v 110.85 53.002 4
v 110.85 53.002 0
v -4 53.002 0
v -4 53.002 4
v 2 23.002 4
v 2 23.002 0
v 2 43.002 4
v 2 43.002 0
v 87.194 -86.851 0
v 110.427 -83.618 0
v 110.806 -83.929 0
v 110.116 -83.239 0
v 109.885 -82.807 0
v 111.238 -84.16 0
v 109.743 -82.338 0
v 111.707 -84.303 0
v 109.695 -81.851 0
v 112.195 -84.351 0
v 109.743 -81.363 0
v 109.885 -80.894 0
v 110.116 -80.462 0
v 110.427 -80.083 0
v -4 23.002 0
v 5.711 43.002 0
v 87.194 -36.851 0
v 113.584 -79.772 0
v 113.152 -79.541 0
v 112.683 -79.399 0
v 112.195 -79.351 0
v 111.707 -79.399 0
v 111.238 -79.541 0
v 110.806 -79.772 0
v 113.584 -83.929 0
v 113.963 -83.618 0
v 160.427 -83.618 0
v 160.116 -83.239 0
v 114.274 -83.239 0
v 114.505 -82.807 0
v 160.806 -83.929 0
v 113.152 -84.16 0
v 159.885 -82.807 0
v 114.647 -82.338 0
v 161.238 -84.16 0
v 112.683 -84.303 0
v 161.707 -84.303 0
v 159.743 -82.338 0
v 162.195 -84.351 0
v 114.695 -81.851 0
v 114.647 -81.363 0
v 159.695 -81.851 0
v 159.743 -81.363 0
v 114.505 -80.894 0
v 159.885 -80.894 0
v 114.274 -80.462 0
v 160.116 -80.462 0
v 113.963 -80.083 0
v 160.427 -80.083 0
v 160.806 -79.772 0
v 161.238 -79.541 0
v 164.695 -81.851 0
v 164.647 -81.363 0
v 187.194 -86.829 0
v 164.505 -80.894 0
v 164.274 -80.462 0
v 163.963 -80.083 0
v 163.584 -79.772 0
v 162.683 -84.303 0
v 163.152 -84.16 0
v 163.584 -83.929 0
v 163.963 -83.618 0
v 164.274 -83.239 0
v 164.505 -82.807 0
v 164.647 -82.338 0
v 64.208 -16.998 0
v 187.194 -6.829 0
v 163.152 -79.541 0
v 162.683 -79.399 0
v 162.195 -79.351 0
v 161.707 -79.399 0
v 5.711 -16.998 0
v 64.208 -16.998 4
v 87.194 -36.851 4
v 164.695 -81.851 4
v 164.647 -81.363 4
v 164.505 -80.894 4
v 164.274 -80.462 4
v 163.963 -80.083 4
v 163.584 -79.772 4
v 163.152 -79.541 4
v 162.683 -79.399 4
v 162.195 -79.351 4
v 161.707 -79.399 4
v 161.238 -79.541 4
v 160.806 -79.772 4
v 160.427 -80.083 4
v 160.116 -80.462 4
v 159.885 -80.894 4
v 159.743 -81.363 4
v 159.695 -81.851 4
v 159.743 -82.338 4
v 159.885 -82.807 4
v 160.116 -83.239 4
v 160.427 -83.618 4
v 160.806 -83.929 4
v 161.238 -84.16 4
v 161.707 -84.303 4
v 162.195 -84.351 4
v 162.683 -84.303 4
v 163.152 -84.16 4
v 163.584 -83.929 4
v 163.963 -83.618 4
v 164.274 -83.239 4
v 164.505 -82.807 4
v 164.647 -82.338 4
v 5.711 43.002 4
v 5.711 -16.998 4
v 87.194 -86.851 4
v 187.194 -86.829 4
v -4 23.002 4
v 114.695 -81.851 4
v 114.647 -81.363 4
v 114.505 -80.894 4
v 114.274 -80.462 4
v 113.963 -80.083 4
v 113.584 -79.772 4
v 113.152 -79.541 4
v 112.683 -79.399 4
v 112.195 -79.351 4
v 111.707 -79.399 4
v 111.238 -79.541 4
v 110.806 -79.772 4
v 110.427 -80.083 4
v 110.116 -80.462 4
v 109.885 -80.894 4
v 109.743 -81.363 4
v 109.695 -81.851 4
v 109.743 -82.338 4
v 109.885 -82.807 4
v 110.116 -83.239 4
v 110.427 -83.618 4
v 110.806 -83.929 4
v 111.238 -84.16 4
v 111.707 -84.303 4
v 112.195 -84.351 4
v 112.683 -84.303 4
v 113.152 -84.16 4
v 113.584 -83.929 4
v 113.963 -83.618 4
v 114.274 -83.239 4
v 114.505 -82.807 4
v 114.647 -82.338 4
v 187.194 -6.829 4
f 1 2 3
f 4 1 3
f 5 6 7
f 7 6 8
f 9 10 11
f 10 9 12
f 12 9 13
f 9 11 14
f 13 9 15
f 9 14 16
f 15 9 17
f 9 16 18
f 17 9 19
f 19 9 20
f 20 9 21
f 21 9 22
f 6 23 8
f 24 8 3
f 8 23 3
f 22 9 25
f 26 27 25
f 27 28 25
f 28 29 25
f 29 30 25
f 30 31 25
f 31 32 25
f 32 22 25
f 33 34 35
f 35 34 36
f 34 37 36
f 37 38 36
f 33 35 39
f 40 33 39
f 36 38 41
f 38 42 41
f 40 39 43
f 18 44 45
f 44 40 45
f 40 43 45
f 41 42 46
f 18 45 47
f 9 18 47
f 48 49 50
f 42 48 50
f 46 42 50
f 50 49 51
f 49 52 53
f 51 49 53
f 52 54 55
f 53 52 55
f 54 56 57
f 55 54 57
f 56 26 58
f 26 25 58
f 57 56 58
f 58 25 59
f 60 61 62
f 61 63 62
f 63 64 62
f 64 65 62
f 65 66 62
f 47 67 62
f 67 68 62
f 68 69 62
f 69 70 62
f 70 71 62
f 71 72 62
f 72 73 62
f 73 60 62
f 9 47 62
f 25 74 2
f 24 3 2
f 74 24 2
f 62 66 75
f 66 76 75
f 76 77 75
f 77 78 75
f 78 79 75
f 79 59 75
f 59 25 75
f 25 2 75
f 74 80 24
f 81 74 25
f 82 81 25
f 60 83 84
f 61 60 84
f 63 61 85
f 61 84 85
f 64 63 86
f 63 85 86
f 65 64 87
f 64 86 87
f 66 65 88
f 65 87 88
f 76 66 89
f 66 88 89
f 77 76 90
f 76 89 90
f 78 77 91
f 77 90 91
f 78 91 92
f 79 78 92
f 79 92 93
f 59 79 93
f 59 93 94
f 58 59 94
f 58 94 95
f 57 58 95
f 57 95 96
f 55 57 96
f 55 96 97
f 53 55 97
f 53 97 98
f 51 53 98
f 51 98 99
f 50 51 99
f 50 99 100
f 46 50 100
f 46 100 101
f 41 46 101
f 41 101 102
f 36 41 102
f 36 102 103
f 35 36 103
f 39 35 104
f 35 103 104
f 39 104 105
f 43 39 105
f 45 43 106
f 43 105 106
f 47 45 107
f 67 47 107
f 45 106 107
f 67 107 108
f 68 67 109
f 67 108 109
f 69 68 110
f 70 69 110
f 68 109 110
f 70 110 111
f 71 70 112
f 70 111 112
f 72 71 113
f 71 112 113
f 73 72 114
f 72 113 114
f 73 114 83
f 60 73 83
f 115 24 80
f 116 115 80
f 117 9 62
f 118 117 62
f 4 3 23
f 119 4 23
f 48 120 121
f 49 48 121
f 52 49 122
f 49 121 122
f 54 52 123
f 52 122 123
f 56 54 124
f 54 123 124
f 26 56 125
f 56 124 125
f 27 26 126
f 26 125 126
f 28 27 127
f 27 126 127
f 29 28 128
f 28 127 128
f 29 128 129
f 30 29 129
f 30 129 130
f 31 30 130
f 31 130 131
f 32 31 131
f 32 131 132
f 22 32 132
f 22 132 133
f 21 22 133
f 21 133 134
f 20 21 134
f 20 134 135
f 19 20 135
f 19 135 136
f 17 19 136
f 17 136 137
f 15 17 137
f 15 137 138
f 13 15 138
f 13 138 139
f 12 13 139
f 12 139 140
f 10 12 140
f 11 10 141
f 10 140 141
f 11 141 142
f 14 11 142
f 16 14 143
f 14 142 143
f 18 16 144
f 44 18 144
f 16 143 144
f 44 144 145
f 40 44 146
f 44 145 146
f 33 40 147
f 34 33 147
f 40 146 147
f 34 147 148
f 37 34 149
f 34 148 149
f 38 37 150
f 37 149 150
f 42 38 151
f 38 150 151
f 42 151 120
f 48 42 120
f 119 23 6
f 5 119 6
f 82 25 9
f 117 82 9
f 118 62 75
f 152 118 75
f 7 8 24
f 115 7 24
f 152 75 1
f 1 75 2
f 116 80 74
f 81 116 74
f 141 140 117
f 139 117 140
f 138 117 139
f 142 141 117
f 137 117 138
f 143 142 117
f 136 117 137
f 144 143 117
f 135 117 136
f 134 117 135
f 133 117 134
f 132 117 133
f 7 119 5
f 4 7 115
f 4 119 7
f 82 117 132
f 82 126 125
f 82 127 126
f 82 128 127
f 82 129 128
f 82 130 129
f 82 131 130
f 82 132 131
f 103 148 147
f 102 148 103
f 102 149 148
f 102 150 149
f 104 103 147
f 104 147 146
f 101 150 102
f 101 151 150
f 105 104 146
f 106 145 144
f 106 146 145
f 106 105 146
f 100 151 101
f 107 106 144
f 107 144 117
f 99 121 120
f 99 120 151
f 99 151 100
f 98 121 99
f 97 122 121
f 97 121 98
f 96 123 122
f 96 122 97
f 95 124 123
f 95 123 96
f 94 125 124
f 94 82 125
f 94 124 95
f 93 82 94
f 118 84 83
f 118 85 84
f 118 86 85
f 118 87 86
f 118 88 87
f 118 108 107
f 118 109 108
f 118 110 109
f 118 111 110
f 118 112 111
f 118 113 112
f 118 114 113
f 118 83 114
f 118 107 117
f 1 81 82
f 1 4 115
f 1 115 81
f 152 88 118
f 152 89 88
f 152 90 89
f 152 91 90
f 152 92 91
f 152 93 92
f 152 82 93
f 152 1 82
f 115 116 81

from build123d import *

# Parameters (mm, degrees)
EXTRUDE_1_DEPTH     = 4
SKETCH_2_R          = 2.5
CUT_EXTRUDE_1_DEPTH = 5


with BuildPart() as part:
    # Эскиз1 → Бобышка-Вытянуть1 (new body)
    with BuildSketch(Plane.XY):
        Polygon((87.193826731, -36.850553491), (87.193826731, -86.850553491), (187.193824318, -86.828585686), (187.193824318, -6.828585686), (110.85, 53.001797886), (6, 53.001797886), (-4, 53.001797886), (-4, 23.001797886), (2, 23.001797886), (2, 43.001797886), (5.711449025, 43.001797886), (5.711449025, -16.998202114), (64.208325653, -16.998202114), align=None)
    extrude(amount=EXTRUDE_1_DEPTH)

    # Эскиз2 → Вырез-Вытянуть1 (cut, through all)
    with BuildSketch(Plane.XY.offset(4)):
        with Locations((112.19490079, -81.850553491)):
            Circle(SKETCH_2_R)
        with Locations((162.19490079, -81.850553491)):
            Circle(SKETCH_2_R)
    extrude(amount=-CUT_EXTRUDE_1_DEPTH, mode=Mode.SUBTRACT)


solid = part.part
